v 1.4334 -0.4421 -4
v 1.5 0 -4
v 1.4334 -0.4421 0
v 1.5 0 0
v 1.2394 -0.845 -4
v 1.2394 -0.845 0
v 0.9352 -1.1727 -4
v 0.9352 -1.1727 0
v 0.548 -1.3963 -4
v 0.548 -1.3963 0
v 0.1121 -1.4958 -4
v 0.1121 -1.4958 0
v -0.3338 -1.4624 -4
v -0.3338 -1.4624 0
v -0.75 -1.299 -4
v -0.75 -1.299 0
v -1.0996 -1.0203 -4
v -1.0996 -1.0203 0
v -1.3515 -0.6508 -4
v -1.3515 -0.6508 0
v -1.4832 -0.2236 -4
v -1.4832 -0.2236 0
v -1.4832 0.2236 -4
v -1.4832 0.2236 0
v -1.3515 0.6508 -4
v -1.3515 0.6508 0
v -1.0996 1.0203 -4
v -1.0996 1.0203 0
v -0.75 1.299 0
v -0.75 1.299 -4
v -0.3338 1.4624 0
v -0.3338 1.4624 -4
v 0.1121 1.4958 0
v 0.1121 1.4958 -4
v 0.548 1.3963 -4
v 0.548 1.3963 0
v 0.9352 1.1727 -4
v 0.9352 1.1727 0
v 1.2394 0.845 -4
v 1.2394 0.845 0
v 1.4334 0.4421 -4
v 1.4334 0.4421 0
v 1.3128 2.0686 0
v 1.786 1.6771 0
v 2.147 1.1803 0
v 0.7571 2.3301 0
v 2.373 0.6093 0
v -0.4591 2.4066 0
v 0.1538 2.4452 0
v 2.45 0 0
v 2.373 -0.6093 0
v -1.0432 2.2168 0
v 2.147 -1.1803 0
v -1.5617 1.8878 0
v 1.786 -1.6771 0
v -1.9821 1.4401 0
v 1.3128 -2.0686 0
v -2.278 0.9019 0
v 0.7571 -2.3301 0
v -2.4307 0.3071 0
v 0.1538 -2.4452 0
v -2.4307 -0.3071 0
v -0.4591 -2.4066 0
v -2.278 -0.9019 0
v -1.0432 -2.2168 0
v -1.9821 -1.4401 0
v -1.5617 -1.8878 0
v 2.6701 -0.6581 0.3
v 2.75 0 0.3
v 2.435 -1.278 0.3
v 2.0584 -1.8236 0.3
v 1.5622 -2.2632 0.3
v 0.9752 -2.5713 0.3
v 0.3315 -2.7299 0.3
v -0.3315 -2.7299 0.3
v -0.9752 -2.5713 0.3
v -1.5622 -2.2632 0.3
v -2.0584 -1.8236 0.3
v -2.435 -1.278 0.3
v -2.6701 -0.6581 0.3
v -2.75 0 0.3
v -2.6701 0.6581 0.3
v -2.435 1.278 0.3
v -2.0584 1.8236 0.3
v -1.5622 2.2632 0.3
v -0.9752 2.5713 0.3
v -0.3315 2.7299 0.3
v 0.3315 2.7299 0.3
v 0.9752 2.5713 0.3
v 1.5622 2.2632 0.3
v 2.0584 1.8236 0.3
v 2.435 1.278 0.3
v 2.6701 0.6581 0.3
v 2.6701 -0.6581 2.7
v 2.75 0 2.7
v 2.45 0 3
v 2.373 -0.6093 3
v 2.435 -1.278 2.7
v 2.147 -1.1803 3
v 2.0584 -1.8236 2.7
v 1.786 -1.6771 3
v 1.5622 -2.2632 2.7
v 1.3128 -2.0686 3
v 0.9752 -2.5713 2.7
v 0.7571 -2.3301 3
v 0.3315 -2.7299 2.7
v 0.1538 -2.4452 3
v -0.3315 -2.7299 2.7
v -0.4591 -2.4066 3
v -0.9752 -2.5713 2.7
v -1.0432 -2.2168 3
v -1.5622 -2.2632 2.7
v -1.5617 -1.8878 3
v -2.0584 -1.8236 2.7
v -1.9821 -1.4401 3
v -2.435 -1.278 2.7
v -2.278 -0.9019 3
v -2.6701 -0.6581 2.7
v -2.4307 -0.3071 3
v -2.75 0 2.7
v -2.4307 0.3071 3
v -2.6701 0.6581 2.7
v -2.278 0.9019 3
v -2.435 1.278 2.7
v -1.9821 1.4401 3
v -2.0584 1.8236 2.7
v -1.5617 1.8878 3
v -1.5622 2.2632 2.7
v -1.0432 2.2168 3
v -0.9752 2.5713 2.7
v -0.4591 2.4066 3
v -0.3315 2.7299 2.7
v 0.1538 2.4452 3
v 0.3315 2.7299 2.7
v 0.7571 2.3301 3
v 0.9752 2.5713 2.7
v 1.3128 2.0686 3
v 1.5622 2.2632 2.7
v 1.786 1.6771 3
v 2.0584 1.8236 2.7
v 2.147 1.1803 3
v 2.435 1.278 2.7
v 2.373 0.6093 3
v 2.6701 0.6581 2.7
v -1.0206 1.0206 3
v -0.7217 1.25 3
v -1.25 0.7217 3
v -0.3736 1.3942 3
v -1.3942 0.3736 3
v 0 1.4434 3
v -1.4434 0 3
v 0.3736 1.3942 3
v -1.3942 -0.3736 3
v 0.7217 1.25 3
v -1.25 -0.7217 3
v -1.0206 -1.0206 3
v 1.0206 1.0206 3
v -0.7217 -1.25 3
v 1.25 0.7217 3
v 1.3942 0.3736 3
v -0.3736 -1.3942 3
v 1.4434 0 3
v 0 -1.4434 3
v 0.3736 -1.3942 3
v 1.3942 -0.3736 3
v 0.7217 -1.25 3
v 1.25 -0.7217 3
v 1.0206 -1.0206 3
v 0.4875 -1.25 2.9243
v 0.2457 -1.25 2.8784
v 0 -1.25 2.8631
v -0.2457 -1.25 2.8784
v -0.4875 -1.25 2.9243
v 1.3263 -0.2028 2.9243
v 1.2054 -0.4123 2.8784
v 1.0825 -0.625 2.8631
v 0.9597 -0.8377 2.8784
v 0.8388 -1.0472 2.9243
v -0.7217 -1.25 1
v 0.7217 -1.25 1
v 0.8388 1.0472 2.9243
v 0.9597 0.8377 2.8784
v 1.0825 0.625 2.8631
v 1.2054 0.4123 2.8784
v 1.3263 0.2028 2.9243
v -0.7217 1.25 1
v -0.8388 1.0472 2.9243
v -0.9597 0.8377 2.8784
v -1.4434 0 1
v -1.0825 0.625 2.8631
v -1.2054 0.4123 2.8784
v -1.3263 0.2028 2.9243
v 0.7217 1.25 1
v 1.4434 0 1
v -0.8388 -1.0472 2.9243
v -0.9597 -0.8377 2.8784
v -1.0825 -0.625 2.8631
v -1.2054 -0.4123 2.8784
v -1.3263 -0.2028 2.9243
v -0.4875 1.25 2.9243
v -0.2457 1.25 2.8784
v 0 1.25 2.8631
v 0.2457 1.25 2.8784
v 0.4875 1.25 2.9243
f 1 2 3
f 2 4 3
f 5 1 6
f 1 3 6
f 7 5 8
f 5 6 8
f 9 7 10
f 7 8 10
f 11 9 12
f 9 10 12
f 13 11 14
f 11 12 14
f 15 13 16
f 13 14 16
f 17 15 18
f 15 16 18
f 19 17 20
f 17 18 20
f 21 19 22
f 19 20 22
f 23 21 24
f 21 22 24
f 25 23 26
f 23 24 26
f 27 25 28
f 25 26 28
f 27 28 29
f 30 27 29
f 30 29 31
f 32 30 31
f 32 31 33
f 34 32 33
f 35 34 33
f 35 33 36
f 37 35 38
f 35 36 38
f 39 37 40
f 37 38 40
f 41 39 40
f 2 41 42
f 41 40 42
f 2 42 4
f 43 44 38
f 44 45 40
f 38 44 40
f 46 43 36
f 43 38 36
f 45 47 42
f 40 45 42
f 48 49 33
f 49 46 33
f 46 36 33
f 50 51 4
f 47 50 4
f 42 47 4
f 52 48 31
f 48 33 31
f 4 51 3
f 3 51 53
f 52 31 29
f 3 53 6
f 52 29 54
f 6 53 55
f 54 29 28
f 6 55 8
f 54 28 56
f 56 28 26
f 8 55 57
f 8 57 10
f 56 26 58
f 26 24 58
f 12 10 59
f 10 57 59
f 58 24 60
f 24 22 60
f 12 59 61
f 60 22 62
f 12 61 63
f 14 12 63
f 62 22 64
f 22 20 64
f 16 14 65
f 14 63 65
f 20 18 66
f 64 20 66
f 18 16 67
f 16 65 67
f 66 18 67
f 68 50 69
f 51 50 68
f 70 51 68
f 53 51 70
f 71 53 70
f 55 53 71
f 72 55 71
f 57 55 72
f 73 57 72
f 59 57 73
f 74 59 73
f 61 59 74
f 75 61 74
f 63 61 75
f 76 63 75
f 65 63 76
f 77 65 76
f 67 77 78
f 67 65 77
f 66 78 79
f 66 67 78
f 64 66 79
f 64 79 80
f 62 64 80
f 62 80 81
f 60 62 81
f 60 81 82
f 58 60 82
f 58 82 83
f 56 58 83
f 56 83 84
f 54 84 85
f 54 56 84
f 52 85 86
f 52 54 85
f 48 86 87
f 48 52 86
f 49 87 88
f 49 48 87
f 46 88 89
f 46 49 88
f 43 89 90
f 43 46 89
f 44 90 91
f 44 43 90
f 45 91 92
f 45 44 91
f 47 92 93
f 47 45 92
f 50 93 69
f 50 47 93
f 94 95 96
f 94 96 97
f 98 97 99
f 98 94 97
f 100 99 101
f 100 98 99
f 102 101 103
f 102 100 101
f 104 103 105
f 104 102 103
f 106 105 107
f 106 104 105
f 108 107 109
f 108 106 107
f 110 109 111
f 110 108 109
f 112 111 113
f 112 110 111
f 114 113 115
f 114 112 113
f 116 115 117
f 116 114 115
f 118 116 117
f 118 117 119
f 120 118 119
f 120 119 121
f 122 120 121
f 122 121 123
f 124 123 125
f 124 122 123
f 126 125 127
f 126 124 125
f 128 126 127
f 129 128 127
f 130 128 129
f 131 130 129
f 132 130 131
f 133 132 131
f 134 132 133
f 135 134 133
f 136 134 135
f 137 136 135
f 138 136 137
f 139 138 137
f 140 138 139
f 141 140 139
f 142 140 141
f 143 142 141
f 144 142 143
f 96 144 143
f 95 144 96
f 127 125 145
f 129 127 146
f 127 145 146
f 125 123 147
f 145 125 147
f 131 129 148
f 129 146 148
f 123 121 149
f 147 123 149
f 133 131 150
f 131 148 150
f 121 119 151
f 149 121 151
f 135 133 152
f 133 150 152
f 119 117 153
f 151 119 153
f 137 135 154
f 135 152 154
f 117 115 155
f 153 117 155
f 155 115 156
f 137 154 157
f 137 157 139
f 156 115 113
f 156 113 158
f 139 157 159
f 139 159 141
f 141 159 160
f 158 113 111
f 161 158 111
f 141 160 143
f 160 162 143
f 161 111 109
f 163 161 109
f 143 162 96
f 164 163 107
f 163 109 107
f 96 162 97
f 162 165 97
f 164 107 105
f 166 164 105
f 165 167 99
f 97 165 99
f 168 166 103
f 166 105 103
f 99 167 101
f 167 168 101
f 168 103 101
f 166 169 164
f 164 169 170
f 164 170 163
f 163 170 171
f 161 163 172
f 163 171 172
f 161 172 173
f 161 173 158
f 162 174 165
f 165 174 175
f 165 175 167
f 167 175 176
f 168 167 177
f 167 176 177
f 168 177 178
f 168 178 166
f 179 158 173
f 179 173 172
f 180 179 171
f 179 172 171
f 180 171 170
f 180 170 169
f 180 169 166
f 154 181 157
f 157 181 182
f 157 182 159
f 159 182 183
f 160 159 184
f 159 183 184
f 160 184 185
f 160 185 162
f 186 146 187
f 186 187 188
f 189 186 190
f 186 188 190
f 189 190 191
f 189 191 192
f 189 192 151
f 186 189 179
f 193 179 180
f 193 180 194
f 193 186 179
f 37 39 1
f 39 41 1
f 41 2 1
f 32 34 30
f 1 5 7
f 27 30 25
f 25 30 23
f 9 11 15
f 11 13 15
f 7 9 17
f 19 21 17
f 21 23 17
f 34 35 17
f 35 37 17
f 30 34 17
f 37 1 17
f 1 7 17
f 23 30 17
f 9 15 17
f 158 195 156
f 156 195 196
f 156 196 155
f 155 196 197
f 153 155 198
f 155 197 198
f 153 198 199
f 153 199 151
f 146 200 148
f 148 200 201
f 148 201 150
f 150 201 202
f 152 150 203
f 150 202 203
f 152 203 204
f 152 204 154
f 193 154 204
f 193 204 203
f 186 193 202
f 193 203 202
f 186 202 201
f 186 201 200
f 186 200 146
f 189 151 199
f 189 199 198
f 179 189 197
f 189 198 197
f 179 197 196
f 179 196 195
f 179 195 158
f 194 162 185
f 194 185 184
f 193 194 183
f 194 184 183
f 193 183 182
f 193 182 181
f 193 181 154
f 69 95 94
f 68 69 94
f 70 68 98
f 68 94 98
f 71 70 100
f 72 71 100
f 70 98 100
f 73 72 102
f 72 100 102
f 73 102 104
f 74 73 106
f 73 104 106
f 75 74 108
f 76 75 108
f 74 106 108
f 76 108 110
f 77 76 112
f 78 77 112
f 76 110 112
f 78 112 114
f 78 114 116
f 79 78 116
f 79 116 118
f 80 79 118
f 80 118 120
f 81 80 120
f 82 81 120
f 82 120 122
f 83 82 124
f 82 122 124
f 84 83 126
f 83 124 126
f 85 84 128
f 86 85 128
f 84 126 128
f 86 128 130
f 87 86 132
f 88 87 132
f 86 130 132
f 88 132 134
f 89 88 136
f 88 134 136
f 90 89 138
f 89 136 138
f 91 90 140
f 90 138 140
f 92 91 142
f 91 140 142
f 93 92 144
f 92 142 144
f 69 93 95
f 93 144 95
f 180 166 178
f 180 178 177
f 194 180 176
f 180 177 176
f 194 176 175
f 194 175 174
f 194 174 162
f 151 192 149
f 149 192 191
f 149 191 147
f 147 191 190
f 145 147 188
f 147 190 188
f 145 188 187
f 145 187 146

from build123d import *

# Parameters (mm, degrees)
F3_DEPTH = 2
F6_SIZE  = 0.3


with BuildPart() as f1:
    # F0 (on Front) → F1 (revolve)
    with BuildSketch(Plane.XZ):
        Polygon((2.75, 3), (0, 3), (0, -4), (1.5, -4), (1.5, 0), (2.75, 0), align=None)
    revolve(axis=Axis((0, 0, -0.5), (0, 0, -1)))

    # F2 (on face) → F3 (cut)
    with BuildSketch(Plane.XY.offset(3)):
        Polygon((1.443375673, 0), (0.7216878365, 1.25), (-0.7216878365, 1.25), (-1.443375673, 0), (-0.7216878365, -1.25), (0.7216878365, -1.25), align=None)
    extrude(amount=-F3_DEPTH, mode=Mode.SUBTRACT)

    # F4 (on Front) → F5 (revolve, cut)
    with BuildSketch(Plane.XZ):
        with BuildLine():
            Line((0, 2.5), (0, 7.1666666667))
            ThreePointArc((0, 7.1666666667), (-2.3333333333, 4.8333333333), (0, 2.5))
        make_face()
    revolve(axis=Axis((0, 0, 2.4166666667), (0, 0, -1)), mode=Mode.SUBTRACT)

    # F6
    f6_edges = [f1.edges().sort_by_distance(p)[0] for p in [
        (-2.75, 0, 3),
        (-2.75, 0, 0),
    ]]
    chamfer(f6_edges, length=F6_SIZE)


solid = f1.part
